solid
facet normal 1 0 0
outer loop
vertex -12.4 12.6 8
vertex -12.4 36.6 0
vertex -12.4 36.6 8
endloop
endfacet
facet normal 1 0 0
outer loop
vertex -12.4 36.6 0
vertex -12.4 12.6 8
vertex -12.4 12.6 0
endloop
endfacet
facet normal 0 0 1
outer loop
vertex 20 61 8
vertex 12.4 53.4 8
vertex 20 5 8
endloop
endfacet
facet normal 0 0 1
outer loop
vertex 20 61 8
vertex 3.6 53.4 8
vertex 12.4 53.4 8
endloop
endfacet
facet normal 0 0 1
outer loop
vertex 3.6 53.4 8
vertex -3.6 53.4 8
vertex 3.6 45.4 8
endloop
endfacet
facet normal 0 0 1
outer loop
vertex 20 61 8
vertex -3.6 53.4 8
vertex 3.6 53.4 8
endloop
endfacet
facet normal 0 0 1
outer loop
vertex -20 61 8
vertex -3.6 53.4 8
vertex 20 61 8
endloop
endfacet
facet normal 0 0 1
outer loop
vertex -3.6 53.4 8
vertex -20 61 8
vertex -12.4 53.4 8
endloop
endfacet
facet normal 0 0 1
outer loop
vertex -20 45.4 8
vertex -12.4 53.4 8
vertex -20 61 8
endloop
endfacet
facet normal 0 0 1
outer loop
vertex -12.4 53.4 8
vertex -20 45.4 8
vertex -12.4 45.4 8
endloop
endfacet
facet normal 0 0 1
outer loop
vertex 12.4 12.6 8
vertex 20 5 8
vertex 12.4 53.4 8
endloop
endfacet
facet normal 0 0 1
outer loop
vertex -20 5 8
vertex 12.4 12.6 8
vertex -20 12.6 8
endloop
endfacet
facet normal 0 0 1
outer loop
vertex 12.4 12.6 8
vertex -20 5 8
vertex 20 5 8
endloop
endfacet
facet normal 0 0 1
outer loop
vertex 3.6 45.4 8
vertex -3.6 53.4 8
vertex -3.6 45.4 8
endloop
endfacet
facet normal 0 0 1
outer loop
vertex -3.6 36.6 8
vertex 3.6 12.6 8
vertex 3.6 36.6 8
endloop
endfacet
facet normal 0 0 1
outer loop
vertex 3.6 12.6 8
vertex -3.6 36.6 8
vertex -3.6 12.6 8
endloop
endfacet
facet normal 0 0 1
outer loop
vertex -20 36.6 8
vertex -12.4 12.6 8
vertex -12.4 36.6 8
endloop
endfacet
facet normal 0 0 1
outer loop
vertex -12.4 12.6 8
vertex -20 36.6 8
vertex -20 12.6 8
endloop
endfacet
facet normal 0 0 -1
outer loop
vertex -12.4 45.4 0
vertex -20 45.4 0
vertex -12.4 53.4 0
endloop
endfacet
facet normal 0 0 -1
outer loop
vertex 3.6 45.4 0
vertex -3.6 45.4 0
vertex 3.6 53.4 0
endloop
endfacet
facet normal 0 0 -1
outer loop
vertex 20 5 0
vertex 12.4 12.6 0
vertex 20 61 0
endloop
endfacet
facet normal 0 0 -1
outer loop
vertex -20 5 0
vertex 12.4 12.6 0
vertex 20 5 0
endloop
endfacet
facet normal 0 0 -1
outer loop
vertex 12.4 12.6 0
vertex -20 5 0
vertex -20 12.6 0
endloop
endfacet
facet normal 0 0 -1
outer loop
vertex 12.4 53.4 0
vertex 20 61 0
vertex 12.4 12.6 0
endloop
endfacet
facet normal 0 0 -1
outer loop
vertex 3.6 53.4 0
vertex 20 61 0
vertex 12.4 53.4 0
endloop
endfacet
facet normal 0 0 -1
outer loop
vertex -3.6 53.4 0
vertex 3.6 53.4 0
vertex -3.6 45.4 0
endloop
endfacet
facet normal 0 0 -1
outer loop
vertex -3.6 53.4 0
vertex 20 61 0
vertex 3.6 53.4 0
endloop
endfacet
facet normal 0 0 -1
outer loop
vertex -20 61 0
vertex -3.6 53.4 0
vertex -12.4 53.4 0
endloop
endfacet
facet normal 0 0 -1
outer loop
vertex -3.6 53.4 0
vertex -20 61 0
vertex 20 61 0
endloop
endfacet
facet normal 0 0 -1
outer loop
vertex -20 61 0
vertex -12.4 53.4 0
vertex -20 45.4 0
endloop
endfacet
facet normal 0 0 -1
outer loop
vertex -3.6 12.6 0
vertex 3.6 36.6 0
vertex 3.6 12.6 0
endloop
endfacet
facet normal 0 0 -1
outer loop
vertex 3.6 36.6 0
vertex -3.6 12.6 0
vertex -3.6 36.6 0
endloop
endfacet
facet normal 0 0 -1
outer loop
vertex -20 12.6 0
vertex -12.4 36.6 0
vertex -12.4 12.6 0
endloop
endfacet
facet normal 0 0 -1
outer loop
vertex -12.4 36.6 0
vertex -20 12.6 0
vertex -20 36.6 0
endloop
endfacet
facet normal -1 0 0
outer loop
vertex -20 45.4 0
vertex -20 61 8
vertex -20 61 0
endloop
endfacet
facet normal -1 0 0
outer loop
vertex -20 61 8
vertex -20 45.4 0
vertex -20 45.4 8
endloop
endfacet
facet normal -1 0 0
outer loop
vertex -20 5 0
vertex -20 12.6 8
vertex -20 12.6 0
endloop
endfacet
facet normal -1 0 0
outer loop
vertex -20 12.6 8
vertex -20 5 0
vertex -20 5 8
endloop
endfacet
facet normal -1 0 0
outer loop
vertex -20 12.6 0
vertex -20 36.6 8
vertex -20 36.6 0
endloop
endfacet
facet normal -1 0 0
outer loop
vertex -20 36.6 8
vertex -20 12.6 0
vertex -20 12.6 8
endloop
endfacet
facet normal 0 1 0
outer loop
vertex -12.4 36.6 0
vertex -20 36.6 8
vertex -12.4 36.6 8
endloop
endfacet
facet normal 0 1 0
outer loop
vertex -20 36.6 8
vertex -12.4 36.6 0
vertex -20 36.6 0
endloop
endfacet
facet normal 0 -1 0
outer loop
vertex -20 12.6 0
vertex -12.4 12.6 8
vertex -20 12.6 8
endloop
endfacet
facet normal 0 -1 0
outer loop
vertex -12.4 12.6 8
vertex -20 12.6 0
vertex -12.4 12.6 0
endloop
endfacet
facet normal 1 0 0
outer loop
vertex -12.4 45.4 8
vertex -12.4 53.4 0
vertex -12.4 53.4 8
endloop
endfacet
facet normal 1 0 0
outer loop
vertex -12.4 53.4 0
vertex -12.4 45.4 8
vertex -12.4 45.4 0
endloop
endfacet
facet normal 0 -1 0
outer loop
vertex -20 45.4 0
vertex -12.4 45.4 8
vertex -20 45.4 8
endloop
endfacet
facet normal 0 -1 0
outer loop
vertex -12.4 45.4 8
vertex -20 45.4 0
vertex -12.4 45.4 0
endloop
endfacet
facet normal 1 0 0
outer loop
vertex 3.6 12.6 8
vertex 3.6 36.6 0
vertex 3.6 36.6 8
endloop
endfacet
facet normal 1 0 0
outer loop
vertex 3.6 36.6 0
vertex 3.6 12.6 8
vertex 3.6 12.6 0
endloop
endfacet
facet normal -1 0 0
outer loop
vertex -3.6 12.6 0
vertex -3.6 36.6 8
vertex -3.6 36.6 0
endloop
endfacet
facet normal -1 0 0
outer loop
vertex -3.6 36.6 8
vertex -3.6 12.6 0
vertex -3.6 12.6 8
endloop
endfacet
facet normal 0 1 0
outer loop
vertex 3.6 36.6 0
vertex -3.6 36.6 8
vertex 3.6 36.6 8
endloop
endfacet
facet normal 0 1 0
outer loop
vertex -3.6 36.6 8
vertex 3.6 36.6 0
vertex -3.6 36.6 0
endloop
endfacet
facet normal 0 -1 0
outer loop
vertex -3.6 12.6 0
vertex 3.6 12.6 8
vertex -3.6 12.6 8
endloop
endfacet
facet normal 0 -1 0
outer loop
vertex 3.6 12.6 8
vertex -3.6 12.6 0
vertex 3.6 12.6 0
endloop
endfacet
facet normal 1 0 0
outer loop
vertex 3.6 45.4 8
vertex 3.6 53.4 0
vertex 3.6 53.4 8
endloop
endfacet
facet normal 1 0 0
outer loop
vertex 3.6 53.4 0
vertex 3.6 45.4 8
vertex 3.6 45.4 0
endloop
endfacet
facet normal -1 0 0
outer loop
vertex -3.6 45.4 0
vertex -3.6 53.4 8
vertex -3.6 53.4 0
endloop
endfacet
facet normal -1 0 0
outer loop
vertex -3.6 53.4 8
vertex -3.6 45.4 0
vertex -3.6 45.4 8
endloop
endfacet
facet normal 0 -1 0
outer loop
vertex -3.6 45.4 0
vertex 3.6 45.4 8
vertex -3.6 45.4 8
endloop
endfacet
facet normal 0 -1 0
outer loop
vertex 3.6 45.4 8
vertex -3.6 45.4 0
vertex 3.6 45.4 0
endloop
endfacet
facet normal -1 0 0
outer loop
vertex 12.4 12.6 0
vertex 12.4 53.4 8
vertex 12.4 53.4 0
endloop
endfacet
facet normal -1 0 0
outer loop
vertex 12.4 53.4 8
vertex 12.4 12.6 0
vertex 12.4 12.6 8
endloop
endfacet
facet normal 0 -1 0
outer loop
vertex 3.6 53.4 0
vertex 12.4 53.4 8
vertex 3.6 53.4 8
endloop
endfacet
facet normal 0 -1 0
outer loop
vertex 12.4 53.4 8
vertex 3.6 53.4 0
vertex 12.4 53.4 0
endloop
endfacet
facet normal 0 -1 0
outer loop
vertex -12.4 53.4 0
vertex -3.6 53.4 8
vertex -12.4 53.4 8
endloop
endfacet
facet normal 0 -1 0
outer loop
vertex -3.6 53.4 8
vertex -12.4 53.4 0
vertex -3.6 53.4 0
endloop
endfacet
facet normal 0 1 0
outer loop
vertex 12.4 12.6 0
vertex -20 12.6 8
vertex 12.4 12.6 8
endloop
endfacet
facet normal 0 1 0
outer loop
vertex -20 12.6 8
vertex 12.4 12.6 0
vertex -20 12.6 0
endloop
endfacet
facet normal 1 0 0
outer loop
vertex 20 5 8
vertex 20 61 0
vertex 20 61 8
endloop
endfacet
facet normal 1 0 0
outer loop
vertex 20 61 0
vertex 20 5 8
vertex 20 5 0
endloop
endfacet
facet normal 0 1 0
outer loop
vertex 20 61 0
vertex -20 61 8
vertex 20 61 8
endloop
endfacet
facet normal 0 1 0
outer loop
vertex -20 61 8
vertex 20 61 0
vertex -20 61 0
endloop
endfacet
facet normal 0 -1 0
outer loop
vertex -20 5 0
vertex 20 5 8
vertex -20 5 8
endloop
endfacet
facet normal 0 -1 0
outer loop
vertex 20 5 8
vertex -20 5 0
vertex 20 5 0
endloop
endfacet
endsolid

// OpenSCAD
difference() {
  translate([0.0000000000, 33.0001196000, 4.0000000000]) {
    scale([40.0000000000, 56.0000000000, 8.0000000000]) {
      translate([-0.5000000000, -0.5000000000, -0.5000000000]) {
        cube([1, 1, 1]);
      }
    }
  }
  difference() {
    translate([-3.8000016000, 32.9999376000, 4.0000000000]) {
      scale([32.4000000000, 40.8000000000, 8.0000000000]) {
        translate([-0.5000000000, -0.5000000000, -0.5000000000]) {
          cube([1, 1, 1]);
        }
      }
    }
    union() {
      union() {
        union() {
          translate([-16.2000000000, 24.6000000000, 4.0000000000]) {
            scale([7.6000000000, 24.0000000000, 8.0000000000]) {
              translate([-0.5000000000, -0.5000000000, -0.5000000000]) {
                cube([1, 1, 1]);
              }
            }
          }
          translate([-16.2000000000, 49.4000000000, 4.0000000000]) {
            scale([7.6000000000, 8.0000000000, 8.0000000000]) {
              translate([-0.5000000000, -0.5000000000, -0.5000000000]) {
                cube([1, 1, 1]);
              }
            }
          }
        }
        translate([0.0000000000, 24.6000000000, 4.0000000000]) {
          scale([7.2000000000, 24.0000000000, 8.0000000000]) {
            translate([-0.5000000000, -0.5000000000, -0.5000000000]) {
              cube([1, 1, 1]);
            }
          }
        }
      }
      translate([0.0000000000, 49.4000000000, 4.0000000000]) {
        scale([7.2000000000, 8.0000000000, 8.0000000000]) {
          translate([-0.5000000000, -0.5000000000, -0.5000000000]) {
            cube([1, 1, 1]);
          }
        }
      }
    }
  }
}
